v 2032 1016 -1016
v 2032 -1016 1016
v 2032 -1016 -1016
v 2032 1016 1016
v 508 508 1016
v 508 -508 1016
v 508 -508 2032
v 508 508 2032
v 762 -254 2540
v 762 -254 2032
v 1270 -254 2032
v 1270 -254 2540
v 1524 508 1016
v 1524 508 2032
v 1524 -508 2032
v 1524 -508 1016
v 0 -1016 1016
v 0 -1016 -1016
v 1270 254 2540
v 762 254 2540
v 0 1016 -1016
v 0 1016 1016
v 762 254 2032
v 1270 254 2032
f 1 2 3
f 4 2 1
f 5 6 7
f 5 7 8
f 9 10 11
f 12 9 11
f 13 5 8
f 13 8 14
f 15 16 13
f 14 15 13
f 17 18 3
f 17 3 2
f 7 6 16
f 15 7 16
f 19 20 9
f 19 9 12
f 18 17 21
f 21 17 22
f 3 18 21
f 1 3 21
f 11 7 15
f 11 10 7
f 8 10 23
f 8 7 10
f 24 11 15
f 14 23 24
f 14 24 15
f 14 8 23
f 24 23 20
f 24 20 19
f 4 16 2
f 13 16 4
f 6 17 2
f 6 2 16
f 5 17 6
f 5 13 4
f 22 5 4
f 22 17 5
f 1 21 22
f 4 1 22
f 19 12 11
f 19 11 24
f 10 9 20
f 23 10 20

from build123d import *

# Parameters (mm, degrees)
F0_W     = 2032
F0_H     = 2032
F1_DEPTH = 2032
F2_W     = 1016
F2_H     = 1016
F3_DEPTH = 1016
F4_W     = 508
F4_H     = 508
F5_DEPTH = 508


with BuildPart() as f1:
    # F0 (on Right) → F1 (new body)
    with BuildSketch(Plane.YZ):
        Rectangle(F0_W, F0_H)
    extrude(amount=F1_DEPTH)

    # F2 (on face) → F3 (join)
    with BuildSketch(Plane.XY.offset(1016)):
        with Locations((1016, 0)):
            Rectangle(F2_W, F2_H)
    extrude(amount=F3_DEPTH)

    # F4 (on face) → F5 (join)
    with BuildSketch(Plane.XY.offset(2032)):
        with Locations((1016, 0)):
            Rectangle(F4_W, F4_H)
    extrude(amount=F5_DEPTH)


solid = f1.part
